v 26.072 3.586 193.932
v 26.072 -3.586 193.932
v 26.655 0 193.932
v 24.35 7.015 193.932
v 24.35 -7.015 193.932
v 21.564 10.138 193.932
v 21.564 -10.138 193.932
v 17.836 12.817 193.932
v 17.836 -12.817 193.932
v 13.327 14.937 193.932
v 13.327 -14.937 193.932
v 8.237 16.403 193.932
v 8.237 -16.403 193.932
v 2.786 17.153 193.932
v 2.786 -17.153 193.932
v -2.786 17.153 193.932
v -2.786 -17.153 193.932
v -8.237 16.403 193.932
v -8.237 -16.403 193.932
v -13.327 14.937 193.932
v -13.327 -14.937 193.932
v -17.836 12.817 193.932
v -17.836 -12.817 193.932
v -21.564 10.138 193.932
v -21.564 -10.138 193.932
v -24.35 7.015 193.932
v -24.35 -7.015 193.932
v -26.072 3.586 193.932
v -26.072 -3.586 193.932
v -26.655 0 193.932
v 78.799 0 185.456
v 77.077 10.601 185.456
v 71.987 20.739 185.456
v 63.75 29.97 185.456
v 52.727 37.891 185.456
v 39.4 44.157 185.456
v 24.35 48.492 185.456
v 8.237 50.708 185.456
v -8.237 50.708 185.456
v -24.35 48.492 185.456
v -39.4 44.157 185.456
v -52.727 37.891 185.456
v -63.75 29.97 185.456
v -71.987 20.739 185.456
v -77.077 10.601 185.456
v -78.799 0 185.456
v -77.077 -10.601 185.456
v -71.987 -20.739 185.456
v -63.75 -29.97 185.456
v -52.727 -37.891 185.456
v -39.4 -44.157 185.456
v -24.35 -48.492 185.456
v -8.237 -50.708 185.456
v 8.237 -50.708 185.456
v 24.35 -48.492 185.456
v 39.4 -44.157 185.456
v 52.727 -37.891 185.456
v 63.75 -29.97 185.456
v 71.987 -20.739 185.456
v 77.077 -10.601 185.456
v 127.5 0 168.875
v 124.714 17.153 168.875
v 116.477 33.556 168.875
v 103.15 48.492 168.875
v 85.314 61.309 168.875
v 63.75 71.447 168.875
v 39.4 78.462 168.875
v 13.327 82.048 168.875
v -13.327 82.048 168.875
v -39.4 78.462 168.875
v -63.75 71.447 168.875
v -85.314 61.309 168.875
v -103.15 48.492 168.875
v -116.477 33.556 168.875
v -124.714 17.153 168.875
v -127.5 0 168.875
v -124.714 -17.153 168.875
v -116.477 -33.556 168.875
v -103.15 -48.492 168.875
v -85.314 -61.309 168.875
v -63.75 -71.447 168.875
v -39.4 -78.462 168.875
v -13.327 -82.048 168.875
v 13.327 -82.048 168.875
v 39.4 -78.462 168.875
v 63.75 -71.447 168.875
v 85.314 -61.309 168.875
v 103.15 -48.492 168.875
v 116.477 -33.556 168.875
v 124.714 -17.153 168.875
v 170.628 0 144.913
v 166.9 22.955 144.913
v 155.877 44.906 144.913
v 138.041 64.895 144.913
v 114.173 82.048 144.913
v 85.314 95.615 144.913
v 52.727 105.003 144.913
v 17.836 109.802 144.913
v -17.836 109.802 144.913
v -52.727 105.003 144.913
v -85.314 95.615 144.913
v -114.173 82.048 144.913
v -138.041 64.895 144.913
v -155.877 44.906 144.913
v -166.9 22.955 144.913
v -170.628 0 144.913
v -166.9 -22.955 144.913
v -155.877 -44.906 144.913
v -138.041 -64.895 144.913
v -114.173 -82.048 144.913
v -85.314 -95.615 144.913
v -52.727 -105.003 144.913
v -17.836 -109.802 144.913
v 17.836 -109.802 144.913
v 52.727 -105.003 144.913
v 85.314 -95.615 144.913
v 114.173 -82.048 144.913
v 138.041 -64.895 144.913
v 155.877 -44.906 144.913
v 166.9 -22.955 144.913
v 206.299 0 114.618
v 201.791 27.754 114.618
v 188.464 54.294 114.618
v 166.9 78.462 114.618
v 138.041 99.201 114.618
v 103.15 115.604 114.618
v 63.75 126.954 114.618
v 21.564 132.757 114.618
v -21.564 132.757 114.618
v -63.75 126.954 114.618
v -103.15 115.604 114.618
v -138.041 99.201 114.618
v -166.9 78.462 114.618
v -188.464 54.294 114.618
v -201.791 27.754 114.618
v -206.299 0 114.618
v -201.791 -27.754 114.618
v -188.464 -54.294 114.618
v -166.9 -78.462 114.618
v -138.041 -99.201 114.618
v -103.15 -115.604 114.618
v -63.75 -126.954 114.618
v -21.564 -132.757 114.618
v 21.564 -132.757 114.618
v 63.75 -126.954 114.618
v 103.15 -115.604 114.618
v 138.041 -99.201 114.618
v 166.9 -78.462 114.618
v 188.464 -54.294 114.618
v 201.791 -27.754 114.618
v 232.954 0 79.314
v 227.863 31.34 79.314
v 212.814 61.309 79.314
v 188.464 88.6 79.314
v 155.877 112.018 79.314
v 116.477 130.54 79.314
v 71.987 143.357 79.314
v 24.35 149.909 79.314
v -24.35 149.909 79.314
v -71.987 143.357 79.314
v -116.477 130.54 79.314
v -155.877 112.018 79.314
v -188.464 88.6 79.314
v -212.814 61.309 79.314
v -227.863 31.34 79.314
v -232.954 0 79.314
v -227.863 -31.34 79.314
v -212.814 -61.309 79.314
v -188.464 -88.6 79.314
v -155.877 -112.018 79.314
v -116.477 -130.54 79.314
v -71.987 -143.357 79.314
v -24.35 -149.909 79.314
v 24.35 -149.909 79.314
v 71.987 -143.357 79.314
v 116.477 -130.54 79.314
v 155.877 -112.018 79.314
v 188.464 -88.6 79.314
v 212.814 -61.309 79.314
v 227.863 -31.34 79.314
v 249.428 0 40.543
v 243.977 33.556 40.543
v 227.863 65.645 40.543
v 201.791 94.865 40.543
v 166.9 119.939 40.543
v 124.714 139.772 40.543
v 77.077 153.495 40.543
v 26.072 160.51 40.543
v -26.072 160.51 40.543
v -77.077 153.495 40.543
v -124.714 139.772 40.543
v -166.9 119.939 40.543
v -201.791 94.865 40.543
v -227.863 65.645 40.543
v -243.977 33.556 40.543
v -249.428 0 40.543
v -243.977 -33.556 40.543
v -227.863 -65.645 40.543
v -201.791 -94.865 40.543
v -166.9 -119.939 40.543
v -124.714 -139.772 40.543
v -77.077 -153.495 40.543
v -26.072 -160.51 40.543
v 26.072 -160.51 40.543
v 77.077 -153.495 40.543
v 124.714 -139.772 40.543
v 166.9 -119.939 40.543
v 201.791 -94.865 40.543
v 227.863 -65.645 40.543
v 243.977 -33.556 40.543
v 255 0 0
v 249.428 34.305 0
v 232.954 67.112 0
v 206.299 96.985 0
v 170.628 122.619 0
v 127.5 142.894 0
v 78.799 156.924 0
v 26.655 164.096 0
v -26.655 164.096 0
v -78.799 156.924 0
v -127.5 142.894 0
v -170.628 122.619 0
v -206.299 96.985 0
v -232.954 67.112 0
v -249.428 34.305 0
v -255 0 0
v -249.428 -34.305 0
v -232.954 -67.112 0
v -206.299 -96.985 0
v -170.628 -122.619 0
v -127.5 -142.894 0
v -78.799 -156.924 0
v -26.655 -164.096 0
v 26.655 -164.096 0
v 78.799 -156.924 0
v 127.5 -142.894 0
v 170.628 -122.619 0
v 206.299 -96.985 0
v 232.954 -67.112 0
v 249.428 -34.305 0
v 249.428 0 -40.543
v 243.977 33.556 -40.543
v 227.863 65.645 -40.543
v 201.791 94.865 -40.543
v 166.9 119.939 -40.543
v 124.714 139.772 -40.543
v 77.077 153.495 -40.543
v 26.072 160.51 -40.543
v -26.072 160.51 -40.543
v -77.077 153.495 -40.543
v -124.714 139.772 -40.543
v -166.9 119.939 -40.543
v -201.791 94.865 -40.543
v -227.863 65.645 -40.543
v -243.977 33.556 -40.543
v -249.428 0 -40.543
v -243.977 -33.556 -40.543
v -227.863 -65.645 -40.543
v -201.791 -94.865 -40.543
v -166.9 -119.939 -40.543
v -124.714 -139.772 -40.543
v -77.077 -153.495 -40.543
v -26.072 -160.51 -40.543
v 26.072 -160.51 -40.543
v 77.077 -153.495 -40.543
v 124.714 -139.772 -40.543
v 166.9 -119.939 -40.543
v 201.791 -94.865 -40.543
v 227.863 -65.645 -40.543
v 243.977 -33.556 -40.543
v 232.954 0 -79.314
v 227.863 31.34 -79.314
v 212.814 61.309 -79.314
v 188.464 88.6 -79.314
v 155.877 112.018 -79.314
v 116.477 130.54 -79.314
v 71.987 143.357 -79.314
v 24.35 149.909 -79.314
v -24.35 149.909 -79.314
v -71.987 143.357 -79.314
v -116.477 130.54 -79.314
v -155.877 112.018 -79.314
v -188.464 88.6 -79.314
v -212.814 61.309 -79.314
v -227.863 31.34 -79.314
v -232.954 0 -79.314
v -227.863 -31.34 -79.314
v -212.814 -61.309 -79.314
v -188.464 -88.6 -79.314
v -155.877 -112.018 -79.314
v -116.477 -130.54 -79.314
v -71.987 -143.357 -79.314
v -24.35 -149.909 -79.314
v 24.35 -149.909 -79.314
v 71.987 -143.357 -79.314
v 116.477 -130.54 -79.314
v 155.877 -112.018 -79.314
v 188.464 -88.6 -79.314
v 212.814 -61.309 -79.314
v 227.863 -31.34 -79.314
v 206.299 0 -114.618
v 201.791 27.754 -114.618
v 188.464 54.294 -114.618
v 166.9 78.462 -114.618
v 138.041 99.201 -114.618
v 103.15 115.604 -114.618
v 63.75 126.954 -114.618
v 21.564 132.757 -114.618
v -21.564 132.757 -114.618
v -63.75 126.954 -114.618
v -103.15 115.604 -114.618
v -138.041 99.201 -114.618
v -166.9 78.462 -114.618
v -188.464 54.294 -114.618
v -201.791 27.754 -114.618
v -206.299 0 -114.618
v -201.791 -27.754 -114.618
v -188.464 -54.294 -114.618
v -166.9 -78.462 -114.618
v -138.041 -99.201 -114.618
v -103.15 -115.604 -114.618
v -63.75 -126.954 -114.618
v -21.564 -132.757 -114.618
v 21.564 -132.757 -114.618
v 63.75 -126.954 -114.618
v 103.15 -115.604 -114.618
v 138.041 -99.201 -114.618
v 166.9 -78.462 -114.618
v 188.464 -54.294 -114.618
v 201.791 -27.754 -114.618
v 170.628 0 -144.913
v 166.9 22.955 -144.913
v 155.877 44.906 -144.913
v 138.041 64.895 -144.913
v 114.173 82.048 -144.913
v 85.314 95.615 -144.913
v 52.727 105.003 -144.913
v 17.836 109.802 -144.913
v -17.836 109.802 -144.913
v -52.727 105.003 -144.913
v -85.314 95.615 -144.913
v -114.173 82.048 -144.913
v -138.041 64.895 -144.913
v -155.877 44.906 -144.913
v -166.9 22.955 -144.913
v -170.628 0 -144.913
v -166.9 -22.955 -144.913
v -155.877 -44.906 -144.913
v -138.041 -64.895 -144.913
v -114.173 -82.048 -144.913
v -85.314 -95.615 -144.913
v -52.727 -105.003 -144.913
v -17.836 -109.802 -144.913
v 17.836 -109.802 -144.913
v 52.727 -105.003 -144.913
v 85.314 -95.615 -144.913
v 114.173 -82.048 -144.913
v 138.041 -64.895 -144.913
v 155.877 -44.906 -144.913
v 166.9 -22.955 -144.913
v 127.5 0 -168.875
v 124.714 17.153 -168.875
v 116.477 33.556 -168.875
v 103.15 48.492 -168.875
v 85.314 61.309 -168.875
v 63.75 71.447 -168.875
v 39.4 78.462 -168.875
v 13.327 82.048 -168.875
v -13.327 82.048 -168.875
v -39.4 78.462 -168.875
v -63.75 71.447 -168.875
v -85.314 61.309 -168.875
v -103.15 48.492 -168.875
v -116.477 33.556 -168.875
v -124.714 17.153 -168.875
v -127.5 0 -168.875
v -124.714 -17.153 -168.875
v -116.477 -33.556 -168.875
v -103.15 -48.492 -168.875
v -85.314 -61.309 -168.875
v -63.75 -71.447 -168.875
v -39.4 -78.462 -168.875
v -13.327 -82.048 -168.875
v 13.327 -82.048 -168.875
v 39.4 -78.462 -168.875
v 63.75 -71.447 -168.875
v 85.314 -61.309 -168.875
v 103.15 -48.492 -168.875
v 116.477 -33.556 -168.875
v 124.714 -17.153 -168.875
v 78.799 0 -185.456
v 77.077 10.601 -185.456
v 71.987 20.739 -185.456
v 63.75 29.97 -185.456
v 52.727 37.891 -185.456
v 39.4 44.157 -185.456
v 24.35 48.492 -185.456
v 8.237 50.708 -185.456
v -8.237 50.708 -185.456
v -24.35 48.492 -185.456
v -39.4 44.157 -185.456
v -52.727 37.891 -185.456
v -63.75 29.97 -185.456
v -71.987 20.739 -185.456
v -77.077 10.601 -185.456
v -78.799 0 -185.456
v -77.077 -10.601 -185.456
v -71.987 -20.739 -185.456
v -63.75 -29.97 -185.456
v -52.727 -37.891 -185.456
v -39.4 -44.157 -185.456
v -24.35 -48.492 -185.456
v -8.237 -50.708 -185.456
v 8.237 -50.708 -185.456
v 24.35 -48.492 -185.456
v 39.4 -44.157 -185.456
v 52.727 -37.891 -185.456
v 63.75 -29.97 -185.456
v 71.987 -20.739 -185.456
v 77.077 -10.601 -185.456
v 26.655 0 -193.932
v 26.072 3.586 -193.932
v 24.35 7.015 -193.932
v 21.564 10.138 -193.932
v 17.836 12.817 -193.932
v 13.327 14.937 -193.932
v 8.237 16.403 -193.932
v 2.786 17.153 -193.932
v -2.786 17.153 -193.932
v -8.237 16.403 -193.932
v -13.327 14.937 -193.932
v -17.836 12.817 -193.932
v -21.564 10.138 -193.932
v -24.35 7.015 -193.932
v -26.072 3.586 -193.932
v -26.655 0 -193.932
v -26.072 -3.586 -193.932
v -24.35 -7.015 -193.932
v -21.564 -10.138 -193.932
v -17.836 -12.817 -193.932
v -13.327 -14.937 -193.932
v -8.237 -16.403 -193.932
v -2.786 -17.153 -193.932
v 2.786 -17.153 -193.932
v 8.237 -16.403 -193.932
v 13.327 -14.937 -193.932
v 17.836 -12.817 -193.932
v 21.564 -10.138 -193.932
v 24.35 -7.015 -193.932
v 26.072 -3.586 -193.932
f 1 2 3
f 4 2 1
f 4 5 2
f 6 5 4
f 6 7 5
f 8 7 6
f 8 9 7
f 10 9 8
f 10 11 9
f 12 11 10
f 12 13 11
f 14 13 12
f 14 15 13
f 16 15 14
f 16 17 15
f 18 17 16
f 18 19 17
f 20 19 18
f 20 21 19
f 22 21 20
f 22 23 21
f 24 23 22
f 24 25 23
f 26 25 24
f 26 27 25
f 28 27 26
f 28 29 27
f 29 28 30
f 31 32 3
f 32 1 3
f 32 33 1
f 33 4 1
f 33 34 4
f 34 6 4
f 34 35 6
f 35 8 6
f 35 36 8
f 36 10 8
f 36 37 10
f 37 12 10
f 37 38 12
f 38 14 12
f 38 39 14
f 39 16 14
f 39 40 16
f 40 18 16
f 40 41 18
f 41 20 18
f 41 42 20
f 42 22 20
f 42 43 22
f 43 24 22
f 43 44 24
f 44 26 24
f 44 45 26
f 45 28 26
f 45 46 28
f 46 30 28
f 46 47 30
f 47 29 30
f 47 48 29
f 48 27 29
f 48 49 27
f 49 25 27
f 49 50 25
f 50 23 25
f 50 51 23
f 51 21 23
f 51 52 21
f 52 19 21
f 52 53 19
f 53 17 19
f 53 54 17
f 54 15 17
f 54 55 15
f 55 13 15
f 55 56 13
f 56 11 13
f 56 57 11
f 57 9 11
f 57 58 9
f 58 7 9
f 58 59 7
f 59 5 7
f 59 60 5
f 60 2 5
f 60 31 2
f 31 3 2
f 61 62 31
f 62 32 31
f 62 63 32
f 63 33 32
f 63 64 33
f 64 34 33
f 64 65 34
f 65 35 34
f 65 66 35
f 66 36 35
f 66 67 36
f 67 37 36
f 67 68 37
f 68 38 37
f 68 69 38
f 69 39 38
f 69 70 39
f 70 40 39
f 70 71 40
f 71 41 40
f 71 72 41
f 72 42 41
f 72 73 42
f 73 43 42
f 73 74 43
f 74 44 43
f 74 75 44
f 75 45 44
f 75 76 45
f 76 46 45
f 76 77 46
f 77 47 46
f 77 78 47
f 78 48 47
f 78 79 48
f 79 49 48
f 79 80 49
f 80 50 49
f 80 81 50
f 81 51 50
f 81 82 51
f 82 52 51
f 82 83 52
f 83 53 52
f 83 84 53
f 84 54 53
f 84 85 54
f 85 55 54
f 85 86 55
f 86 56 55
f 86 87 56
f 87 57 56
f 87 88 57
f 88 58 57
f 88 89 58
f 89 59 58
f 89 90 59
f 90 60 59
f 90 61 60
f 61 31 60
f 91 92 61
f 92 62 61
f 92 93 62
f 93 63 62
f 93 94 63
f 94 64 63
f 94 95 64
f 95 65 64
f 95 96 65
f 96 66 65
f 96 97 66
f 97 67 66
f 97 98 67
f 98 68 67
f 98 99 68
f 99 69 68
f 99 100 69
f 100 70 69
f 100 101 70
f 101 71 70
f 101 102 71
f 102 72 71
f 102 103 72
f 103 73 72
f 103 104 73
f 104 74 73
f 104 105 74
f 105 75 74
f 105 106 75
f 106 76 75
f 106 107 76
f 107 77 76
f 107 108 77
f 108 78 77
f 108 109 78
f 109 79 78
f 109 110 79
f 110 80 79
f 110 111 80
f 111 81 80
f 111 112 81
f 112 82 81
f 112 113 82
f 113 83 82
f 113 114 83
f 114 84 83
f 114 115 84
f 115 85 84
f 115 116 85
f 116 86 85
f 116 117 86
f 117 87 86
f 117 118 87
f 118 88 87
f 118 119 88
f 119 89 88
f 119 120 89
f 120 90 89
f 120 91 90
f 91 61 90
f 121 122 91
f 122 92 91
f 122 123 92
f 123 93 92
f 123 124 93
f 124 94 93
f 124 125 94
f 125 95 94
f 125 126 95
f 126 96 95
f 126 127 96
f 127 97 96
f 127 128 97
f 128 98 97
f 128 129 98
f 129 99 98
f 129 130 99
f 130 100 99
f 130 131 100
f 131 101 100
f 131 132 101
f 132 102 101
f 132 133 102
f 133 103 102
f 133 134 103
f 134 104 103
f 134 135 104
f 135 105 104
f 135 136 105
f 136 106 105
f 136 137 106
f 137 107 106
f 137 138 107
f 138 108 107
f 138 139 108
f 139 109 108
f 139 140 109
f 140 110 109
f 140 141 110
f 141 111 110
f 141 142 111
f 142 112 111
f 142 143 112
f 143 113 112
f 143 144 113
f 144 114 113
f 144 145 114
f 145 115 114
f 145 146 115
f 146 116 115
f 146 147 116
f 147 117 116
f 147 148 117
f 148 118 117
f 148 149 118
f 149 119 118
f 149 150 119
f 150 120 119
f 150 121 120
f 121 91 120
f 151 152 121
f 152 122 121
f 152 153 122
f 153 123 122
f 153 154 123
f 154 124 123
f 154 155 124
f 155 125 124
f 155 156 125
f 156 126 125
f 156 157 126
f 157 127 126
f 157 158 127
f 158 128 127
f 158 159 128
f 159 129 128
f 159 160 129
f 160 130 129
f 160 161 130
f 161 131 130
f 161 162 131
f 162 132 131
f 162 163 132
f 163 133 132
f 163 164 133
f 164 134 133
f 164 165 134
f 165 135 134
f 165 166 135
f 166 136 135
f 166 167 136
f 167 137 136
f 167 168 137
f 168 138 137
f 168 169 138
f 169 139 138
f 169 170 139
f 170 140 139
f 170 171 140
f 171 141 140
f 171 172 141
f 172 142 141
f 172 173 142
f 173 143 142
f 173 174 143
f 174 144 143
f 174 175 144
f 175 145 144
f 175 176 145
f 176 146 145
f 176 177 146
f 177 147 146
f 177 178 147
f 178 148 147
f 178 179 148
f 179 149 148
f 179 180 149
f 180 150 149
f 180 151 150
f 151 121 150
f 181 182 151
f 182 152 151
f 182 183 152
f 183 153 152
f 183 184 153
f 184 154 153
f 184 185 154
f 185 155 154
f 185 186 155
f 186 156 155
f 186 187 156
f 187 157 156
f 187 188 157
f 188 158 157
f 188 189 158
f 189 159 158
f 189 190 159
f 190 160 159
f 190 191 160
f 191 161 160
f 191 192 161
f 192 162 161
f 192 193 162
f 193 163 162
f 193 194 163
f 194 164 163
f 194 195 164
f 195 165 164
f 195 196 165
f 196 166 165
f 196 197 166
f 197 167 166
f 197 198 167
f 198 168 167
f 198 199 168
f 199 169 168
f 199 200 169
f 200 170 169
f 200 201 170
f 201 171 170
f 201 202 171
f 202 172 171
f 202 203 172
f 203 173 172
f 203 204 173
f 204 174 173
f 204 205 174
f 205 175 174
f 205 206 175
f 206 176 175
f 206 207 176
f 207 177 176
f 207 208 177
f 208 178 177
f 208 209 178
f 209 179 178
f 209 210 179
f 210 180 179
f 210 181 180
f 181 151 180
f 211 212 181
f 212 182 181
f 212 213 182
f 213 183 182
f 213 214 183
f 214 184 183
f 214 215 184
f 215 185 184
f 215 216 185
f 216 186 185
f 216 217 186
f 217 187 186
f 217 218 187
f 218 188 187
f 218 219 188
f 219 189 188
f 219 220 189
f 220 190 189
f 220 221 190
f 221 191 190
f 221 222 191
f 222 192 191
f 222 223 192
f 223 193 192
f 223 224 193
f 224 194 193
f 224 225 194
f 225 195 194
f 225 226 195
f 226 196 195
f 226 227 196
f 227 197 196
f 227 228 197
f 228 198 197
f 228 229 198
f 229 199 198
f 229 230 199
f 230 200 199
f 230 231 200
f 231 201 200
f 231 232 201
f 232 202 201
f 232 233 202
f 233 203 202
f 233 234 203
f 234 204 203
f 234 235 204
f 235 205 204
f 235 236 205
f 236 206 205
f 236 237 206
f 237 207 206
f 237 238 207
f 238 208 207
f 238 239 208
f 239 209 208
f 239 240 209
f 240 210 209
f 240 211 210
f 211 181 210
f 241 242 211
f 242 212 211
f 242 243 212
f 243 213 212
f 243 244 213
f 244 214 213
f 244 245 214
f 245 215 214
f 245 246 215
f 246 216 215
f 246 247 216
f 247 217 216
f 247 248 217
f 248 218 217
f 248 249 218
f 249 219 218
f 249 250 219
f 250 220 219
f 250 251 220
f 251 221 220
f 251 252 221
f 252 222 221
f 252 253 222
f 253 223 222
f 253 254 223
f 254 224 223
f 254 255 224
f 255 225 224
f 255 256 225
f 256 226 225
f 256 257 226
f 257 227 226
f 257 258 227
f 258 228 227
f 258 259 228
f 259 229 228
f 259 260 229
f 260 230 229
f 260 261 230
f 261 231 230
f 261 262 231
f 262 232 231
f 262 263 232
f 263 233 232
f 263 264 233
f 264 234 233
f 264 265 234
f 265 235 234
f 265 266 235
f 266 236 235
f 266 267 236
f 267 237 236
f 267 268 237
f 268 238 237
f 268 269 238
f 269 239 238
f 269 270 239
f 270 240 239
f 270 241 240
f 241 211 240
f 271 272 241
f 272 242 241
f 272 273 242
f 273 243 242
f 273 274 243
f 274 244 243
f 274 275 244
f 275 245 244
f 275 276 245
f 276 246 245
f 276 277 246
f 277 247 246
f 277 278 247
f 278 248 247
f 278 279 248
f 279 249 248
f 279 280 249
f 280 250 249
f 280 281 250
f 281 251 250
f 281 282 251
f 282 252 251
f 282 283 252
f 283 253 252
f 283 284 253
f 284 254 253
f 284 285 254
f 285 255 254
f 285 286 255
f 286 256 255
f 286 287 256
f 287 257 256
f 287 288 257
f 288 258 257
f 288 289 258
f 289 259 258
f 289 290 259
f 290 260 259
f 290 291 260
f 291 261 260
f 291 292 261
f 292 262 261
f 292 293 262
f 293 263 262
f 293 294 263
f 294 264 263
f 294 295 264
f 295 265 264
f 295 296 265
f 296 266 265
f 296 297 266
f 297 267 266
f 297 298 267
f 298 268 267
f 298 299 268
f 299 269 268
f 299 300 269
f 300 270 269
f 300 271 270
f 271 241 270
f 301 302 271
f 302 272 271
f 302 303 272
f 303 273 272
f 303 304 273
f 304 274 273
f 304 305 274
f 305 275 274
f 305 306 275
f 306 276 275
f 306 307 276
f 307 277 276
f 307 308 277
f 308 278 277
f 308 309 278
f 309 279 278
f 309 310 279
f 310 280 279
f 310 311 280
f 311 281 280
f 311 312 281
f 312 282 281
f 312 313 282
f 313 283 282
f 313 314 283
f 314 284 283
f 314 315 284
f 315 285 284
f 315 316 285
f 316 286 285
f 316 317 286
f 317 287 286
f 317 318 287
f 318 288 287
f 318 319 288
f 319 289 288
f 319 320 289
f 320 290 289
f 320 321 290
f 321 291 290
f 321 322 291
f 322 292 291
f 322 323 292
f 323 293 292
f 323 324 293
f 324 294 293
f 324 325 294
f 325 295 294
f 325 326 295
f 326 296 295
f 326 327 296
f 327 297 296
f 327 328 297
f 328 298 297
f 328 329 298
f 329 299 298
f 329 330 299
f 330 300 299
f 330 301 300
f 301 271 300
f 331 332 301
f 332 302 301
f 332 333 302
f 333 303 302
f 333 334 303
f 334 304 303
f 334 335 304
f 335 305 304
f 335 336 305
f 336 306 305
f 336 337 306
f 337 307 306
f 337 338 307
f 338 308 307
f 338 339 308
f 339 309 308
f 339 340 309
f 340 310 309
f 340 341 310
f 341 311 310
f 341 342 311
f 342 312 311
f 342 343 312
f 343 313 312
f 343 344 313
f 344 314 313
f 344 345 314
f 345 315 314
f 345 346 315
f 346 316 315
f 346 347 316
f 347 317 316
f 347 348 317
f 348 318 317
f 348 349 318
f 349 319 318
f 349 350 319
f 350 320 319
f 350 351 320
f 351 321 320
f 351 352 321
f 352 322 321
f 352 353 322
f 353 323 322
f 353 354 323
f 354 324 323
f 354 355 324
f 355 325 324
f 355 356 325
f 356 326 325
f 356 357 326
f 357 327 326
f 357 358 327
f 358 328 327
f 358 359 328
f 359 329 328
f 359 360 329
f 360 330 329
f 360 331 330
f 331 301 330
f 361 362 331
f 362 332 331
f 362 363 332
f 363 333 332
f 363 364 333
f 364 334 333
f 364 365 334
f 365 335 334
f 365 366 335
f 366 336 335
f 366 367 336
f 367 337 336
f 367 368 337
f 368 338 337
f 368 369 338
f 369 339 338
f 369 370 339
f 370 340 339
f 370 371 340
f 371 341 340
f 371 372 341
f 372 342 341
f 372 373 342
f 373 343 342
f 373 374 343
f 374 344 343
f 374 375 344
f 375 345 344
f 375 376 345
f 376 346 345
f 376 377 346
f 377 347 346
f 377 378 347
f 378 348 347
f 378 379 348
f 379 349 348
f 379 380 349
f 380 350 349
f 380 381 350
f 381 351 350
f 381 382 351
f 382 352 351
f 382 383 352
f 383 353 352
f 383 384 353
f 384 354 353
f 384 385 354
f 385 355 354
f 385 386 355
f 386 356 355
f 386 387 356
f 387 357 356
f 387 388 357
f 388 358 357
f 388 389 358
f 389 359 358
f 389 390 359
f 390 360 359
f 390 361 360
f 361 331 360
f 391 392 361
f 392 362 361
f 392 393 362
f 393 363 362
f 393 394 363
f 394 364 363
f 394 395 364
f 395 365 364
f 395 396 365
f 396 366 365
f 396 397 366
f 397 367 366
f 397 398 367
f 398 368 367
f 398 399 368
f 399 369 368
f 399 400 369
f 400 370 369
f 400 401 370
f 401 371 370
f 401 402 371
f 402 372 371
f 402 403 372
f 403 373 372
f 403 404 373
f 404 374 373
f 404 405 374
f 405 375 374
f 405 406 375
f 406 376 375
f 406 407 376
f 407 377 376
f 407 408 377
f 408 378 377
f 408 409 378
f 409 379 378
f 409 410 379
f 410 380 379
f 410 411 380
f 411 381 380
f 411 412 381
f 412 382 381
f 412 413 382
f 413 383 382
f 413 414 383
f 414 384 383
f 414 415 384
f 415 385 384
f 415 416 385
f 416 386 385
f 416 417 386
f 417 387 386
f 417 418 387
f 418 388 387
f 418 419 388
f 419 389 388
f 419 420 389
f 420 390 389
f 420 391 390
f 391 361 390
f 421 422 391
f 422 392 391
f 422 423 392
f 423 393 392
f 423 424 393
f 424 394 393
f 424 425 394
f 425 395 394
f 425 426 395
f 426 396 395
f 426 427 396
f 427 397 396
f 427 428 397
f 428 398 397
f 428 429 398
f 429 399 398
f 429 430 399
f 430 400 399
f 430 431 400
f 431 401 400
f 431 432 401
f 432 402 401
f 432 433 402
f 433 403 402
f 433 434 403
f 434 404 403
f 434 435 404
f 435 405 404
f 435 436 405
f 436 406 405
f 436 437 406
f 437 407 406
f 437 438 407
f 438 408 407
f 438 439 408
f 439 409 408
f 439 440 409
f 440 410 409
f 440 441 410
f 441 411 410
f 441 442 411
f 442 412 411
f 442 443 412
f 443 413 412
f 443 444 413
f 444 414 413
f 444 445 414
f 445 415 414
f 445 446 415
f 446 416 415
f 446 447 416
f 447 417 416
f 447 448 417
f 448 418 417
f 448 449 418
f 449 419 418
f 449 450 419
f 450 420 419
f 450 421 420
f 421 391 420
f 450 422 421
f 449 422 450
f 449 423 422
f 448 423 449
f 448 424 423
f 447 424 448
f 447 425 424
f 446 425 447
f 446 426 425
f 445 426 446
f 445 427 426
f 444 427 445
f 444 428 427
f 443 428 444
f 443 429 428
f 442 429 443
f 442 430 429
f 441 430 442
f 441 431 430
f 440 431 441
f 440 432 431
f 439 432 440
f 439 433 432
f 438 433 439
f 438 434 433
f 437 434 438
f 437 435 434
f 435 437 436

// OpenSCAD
// Generated by SolidPython 1.0.1 on 2020-07-29 00:46:53


scale(v = [17, 11, 13]) {
	sphere(r = 15);
}
/***********************************************
*********      SolidPython code:      **********
************************************************
 
# import packages: SolidPython
from solid import *
from solid.utils import *
from itertools import chain, combinations, permutations


class Resize:

    def __init__(self, scad_file):
        self.scad_file = scad_file
        #self.scad_file = import_scad(scad_file)
        # cone/cylinder param:
        self.r1 = 0
        self.r2 = 0
        self.h = 0
        # rectangular prism param:
        self.w = 0
        self.l = 0
        # ellipse param:
        self.r = 0

    # import OpenScad code (file name corresponds to shape)


    # classify shape + parameters
    def assign(self, param1, param2, param3):
        if self.scad_file == 'cone.scad':
            self.r1 = param1
            self.r2 = param2
            self.h = param3
        elif self.scad_file == 'cylinder.scad':
            self.r1 = param1
            self.r2 = param2
            self.h = param3
        elif self.scad_file == 'rectangularPrism.scad':
            self.h = param1
            self.l = param2
            self.w = param3
        else:
            self.r = param1
            self.h = param2

    # resize parameters
    def iterate(self):
        x = range(3, 20, 2)
        i = 1
        if self.scad_file == 'cone.scad':
            tempList = list(permutations(x, 2))
            for temp in tempList:
                param1 = temp[0]
                param2 = temp[1]
                filepath = 'produced_scad_files/' + 'cone' + str(param1) + '_' + str(param2) + '_' + '.scad'
                scad_render_to_file(cylinder(h=param1, r1=param2, r2=0), filepath)

        elif self.scad_file == 'cylinder.scad':
            tempList = list(permutations(x, 3))
            for temp in tempList:
                param1 = temp[0]
                param2 = temp[1]
                filepath = 'produced_scad_files/' + 'cylinder' + str(param1) + '_' + str(param2) + '_' + '.scad'
                scad_render_to_file(cylinder(h=param1, r1=param2, r2=param2), filepath)

        elif self.scad_file == 'rectangularPrism.scad':
            tempList = list(permutations(x, 3))
            for temp in tempList:
                param1 = temp[0]
                param2 = temp[1]
                param3 = temp[2]
                filepath = 'produced_scad_files/' + 'rectangularPrism' + str(param1) + '_' + str(param2) + '_' + str(
                    param3) + '.scad'
                scad_render_to_file(cube(size=(param1, param2, param3)), filepath)

        elif self.scad_file == 'ellipse.scad':
            tempList = list(permutations(x, 4))
            for temp in tempList:
                param1 = temp[0]
                param2 = temp[1]
                param3 = temp[2]
                param4 = temp[3]
                filepath = 'produced_scad_files/' + 'ellipse' + str(param1) + '_' + str(param2) + '_' + str(param3) + '_' + str(param4) + '.scad'
                scad_render_to_file(scale([param1, param2, param3])(sphere(r=param4)), filepath)

    def render_to_scadfile(self):
        scad_render_to_file(scad, 'example.scad') 
 
************************************************/
